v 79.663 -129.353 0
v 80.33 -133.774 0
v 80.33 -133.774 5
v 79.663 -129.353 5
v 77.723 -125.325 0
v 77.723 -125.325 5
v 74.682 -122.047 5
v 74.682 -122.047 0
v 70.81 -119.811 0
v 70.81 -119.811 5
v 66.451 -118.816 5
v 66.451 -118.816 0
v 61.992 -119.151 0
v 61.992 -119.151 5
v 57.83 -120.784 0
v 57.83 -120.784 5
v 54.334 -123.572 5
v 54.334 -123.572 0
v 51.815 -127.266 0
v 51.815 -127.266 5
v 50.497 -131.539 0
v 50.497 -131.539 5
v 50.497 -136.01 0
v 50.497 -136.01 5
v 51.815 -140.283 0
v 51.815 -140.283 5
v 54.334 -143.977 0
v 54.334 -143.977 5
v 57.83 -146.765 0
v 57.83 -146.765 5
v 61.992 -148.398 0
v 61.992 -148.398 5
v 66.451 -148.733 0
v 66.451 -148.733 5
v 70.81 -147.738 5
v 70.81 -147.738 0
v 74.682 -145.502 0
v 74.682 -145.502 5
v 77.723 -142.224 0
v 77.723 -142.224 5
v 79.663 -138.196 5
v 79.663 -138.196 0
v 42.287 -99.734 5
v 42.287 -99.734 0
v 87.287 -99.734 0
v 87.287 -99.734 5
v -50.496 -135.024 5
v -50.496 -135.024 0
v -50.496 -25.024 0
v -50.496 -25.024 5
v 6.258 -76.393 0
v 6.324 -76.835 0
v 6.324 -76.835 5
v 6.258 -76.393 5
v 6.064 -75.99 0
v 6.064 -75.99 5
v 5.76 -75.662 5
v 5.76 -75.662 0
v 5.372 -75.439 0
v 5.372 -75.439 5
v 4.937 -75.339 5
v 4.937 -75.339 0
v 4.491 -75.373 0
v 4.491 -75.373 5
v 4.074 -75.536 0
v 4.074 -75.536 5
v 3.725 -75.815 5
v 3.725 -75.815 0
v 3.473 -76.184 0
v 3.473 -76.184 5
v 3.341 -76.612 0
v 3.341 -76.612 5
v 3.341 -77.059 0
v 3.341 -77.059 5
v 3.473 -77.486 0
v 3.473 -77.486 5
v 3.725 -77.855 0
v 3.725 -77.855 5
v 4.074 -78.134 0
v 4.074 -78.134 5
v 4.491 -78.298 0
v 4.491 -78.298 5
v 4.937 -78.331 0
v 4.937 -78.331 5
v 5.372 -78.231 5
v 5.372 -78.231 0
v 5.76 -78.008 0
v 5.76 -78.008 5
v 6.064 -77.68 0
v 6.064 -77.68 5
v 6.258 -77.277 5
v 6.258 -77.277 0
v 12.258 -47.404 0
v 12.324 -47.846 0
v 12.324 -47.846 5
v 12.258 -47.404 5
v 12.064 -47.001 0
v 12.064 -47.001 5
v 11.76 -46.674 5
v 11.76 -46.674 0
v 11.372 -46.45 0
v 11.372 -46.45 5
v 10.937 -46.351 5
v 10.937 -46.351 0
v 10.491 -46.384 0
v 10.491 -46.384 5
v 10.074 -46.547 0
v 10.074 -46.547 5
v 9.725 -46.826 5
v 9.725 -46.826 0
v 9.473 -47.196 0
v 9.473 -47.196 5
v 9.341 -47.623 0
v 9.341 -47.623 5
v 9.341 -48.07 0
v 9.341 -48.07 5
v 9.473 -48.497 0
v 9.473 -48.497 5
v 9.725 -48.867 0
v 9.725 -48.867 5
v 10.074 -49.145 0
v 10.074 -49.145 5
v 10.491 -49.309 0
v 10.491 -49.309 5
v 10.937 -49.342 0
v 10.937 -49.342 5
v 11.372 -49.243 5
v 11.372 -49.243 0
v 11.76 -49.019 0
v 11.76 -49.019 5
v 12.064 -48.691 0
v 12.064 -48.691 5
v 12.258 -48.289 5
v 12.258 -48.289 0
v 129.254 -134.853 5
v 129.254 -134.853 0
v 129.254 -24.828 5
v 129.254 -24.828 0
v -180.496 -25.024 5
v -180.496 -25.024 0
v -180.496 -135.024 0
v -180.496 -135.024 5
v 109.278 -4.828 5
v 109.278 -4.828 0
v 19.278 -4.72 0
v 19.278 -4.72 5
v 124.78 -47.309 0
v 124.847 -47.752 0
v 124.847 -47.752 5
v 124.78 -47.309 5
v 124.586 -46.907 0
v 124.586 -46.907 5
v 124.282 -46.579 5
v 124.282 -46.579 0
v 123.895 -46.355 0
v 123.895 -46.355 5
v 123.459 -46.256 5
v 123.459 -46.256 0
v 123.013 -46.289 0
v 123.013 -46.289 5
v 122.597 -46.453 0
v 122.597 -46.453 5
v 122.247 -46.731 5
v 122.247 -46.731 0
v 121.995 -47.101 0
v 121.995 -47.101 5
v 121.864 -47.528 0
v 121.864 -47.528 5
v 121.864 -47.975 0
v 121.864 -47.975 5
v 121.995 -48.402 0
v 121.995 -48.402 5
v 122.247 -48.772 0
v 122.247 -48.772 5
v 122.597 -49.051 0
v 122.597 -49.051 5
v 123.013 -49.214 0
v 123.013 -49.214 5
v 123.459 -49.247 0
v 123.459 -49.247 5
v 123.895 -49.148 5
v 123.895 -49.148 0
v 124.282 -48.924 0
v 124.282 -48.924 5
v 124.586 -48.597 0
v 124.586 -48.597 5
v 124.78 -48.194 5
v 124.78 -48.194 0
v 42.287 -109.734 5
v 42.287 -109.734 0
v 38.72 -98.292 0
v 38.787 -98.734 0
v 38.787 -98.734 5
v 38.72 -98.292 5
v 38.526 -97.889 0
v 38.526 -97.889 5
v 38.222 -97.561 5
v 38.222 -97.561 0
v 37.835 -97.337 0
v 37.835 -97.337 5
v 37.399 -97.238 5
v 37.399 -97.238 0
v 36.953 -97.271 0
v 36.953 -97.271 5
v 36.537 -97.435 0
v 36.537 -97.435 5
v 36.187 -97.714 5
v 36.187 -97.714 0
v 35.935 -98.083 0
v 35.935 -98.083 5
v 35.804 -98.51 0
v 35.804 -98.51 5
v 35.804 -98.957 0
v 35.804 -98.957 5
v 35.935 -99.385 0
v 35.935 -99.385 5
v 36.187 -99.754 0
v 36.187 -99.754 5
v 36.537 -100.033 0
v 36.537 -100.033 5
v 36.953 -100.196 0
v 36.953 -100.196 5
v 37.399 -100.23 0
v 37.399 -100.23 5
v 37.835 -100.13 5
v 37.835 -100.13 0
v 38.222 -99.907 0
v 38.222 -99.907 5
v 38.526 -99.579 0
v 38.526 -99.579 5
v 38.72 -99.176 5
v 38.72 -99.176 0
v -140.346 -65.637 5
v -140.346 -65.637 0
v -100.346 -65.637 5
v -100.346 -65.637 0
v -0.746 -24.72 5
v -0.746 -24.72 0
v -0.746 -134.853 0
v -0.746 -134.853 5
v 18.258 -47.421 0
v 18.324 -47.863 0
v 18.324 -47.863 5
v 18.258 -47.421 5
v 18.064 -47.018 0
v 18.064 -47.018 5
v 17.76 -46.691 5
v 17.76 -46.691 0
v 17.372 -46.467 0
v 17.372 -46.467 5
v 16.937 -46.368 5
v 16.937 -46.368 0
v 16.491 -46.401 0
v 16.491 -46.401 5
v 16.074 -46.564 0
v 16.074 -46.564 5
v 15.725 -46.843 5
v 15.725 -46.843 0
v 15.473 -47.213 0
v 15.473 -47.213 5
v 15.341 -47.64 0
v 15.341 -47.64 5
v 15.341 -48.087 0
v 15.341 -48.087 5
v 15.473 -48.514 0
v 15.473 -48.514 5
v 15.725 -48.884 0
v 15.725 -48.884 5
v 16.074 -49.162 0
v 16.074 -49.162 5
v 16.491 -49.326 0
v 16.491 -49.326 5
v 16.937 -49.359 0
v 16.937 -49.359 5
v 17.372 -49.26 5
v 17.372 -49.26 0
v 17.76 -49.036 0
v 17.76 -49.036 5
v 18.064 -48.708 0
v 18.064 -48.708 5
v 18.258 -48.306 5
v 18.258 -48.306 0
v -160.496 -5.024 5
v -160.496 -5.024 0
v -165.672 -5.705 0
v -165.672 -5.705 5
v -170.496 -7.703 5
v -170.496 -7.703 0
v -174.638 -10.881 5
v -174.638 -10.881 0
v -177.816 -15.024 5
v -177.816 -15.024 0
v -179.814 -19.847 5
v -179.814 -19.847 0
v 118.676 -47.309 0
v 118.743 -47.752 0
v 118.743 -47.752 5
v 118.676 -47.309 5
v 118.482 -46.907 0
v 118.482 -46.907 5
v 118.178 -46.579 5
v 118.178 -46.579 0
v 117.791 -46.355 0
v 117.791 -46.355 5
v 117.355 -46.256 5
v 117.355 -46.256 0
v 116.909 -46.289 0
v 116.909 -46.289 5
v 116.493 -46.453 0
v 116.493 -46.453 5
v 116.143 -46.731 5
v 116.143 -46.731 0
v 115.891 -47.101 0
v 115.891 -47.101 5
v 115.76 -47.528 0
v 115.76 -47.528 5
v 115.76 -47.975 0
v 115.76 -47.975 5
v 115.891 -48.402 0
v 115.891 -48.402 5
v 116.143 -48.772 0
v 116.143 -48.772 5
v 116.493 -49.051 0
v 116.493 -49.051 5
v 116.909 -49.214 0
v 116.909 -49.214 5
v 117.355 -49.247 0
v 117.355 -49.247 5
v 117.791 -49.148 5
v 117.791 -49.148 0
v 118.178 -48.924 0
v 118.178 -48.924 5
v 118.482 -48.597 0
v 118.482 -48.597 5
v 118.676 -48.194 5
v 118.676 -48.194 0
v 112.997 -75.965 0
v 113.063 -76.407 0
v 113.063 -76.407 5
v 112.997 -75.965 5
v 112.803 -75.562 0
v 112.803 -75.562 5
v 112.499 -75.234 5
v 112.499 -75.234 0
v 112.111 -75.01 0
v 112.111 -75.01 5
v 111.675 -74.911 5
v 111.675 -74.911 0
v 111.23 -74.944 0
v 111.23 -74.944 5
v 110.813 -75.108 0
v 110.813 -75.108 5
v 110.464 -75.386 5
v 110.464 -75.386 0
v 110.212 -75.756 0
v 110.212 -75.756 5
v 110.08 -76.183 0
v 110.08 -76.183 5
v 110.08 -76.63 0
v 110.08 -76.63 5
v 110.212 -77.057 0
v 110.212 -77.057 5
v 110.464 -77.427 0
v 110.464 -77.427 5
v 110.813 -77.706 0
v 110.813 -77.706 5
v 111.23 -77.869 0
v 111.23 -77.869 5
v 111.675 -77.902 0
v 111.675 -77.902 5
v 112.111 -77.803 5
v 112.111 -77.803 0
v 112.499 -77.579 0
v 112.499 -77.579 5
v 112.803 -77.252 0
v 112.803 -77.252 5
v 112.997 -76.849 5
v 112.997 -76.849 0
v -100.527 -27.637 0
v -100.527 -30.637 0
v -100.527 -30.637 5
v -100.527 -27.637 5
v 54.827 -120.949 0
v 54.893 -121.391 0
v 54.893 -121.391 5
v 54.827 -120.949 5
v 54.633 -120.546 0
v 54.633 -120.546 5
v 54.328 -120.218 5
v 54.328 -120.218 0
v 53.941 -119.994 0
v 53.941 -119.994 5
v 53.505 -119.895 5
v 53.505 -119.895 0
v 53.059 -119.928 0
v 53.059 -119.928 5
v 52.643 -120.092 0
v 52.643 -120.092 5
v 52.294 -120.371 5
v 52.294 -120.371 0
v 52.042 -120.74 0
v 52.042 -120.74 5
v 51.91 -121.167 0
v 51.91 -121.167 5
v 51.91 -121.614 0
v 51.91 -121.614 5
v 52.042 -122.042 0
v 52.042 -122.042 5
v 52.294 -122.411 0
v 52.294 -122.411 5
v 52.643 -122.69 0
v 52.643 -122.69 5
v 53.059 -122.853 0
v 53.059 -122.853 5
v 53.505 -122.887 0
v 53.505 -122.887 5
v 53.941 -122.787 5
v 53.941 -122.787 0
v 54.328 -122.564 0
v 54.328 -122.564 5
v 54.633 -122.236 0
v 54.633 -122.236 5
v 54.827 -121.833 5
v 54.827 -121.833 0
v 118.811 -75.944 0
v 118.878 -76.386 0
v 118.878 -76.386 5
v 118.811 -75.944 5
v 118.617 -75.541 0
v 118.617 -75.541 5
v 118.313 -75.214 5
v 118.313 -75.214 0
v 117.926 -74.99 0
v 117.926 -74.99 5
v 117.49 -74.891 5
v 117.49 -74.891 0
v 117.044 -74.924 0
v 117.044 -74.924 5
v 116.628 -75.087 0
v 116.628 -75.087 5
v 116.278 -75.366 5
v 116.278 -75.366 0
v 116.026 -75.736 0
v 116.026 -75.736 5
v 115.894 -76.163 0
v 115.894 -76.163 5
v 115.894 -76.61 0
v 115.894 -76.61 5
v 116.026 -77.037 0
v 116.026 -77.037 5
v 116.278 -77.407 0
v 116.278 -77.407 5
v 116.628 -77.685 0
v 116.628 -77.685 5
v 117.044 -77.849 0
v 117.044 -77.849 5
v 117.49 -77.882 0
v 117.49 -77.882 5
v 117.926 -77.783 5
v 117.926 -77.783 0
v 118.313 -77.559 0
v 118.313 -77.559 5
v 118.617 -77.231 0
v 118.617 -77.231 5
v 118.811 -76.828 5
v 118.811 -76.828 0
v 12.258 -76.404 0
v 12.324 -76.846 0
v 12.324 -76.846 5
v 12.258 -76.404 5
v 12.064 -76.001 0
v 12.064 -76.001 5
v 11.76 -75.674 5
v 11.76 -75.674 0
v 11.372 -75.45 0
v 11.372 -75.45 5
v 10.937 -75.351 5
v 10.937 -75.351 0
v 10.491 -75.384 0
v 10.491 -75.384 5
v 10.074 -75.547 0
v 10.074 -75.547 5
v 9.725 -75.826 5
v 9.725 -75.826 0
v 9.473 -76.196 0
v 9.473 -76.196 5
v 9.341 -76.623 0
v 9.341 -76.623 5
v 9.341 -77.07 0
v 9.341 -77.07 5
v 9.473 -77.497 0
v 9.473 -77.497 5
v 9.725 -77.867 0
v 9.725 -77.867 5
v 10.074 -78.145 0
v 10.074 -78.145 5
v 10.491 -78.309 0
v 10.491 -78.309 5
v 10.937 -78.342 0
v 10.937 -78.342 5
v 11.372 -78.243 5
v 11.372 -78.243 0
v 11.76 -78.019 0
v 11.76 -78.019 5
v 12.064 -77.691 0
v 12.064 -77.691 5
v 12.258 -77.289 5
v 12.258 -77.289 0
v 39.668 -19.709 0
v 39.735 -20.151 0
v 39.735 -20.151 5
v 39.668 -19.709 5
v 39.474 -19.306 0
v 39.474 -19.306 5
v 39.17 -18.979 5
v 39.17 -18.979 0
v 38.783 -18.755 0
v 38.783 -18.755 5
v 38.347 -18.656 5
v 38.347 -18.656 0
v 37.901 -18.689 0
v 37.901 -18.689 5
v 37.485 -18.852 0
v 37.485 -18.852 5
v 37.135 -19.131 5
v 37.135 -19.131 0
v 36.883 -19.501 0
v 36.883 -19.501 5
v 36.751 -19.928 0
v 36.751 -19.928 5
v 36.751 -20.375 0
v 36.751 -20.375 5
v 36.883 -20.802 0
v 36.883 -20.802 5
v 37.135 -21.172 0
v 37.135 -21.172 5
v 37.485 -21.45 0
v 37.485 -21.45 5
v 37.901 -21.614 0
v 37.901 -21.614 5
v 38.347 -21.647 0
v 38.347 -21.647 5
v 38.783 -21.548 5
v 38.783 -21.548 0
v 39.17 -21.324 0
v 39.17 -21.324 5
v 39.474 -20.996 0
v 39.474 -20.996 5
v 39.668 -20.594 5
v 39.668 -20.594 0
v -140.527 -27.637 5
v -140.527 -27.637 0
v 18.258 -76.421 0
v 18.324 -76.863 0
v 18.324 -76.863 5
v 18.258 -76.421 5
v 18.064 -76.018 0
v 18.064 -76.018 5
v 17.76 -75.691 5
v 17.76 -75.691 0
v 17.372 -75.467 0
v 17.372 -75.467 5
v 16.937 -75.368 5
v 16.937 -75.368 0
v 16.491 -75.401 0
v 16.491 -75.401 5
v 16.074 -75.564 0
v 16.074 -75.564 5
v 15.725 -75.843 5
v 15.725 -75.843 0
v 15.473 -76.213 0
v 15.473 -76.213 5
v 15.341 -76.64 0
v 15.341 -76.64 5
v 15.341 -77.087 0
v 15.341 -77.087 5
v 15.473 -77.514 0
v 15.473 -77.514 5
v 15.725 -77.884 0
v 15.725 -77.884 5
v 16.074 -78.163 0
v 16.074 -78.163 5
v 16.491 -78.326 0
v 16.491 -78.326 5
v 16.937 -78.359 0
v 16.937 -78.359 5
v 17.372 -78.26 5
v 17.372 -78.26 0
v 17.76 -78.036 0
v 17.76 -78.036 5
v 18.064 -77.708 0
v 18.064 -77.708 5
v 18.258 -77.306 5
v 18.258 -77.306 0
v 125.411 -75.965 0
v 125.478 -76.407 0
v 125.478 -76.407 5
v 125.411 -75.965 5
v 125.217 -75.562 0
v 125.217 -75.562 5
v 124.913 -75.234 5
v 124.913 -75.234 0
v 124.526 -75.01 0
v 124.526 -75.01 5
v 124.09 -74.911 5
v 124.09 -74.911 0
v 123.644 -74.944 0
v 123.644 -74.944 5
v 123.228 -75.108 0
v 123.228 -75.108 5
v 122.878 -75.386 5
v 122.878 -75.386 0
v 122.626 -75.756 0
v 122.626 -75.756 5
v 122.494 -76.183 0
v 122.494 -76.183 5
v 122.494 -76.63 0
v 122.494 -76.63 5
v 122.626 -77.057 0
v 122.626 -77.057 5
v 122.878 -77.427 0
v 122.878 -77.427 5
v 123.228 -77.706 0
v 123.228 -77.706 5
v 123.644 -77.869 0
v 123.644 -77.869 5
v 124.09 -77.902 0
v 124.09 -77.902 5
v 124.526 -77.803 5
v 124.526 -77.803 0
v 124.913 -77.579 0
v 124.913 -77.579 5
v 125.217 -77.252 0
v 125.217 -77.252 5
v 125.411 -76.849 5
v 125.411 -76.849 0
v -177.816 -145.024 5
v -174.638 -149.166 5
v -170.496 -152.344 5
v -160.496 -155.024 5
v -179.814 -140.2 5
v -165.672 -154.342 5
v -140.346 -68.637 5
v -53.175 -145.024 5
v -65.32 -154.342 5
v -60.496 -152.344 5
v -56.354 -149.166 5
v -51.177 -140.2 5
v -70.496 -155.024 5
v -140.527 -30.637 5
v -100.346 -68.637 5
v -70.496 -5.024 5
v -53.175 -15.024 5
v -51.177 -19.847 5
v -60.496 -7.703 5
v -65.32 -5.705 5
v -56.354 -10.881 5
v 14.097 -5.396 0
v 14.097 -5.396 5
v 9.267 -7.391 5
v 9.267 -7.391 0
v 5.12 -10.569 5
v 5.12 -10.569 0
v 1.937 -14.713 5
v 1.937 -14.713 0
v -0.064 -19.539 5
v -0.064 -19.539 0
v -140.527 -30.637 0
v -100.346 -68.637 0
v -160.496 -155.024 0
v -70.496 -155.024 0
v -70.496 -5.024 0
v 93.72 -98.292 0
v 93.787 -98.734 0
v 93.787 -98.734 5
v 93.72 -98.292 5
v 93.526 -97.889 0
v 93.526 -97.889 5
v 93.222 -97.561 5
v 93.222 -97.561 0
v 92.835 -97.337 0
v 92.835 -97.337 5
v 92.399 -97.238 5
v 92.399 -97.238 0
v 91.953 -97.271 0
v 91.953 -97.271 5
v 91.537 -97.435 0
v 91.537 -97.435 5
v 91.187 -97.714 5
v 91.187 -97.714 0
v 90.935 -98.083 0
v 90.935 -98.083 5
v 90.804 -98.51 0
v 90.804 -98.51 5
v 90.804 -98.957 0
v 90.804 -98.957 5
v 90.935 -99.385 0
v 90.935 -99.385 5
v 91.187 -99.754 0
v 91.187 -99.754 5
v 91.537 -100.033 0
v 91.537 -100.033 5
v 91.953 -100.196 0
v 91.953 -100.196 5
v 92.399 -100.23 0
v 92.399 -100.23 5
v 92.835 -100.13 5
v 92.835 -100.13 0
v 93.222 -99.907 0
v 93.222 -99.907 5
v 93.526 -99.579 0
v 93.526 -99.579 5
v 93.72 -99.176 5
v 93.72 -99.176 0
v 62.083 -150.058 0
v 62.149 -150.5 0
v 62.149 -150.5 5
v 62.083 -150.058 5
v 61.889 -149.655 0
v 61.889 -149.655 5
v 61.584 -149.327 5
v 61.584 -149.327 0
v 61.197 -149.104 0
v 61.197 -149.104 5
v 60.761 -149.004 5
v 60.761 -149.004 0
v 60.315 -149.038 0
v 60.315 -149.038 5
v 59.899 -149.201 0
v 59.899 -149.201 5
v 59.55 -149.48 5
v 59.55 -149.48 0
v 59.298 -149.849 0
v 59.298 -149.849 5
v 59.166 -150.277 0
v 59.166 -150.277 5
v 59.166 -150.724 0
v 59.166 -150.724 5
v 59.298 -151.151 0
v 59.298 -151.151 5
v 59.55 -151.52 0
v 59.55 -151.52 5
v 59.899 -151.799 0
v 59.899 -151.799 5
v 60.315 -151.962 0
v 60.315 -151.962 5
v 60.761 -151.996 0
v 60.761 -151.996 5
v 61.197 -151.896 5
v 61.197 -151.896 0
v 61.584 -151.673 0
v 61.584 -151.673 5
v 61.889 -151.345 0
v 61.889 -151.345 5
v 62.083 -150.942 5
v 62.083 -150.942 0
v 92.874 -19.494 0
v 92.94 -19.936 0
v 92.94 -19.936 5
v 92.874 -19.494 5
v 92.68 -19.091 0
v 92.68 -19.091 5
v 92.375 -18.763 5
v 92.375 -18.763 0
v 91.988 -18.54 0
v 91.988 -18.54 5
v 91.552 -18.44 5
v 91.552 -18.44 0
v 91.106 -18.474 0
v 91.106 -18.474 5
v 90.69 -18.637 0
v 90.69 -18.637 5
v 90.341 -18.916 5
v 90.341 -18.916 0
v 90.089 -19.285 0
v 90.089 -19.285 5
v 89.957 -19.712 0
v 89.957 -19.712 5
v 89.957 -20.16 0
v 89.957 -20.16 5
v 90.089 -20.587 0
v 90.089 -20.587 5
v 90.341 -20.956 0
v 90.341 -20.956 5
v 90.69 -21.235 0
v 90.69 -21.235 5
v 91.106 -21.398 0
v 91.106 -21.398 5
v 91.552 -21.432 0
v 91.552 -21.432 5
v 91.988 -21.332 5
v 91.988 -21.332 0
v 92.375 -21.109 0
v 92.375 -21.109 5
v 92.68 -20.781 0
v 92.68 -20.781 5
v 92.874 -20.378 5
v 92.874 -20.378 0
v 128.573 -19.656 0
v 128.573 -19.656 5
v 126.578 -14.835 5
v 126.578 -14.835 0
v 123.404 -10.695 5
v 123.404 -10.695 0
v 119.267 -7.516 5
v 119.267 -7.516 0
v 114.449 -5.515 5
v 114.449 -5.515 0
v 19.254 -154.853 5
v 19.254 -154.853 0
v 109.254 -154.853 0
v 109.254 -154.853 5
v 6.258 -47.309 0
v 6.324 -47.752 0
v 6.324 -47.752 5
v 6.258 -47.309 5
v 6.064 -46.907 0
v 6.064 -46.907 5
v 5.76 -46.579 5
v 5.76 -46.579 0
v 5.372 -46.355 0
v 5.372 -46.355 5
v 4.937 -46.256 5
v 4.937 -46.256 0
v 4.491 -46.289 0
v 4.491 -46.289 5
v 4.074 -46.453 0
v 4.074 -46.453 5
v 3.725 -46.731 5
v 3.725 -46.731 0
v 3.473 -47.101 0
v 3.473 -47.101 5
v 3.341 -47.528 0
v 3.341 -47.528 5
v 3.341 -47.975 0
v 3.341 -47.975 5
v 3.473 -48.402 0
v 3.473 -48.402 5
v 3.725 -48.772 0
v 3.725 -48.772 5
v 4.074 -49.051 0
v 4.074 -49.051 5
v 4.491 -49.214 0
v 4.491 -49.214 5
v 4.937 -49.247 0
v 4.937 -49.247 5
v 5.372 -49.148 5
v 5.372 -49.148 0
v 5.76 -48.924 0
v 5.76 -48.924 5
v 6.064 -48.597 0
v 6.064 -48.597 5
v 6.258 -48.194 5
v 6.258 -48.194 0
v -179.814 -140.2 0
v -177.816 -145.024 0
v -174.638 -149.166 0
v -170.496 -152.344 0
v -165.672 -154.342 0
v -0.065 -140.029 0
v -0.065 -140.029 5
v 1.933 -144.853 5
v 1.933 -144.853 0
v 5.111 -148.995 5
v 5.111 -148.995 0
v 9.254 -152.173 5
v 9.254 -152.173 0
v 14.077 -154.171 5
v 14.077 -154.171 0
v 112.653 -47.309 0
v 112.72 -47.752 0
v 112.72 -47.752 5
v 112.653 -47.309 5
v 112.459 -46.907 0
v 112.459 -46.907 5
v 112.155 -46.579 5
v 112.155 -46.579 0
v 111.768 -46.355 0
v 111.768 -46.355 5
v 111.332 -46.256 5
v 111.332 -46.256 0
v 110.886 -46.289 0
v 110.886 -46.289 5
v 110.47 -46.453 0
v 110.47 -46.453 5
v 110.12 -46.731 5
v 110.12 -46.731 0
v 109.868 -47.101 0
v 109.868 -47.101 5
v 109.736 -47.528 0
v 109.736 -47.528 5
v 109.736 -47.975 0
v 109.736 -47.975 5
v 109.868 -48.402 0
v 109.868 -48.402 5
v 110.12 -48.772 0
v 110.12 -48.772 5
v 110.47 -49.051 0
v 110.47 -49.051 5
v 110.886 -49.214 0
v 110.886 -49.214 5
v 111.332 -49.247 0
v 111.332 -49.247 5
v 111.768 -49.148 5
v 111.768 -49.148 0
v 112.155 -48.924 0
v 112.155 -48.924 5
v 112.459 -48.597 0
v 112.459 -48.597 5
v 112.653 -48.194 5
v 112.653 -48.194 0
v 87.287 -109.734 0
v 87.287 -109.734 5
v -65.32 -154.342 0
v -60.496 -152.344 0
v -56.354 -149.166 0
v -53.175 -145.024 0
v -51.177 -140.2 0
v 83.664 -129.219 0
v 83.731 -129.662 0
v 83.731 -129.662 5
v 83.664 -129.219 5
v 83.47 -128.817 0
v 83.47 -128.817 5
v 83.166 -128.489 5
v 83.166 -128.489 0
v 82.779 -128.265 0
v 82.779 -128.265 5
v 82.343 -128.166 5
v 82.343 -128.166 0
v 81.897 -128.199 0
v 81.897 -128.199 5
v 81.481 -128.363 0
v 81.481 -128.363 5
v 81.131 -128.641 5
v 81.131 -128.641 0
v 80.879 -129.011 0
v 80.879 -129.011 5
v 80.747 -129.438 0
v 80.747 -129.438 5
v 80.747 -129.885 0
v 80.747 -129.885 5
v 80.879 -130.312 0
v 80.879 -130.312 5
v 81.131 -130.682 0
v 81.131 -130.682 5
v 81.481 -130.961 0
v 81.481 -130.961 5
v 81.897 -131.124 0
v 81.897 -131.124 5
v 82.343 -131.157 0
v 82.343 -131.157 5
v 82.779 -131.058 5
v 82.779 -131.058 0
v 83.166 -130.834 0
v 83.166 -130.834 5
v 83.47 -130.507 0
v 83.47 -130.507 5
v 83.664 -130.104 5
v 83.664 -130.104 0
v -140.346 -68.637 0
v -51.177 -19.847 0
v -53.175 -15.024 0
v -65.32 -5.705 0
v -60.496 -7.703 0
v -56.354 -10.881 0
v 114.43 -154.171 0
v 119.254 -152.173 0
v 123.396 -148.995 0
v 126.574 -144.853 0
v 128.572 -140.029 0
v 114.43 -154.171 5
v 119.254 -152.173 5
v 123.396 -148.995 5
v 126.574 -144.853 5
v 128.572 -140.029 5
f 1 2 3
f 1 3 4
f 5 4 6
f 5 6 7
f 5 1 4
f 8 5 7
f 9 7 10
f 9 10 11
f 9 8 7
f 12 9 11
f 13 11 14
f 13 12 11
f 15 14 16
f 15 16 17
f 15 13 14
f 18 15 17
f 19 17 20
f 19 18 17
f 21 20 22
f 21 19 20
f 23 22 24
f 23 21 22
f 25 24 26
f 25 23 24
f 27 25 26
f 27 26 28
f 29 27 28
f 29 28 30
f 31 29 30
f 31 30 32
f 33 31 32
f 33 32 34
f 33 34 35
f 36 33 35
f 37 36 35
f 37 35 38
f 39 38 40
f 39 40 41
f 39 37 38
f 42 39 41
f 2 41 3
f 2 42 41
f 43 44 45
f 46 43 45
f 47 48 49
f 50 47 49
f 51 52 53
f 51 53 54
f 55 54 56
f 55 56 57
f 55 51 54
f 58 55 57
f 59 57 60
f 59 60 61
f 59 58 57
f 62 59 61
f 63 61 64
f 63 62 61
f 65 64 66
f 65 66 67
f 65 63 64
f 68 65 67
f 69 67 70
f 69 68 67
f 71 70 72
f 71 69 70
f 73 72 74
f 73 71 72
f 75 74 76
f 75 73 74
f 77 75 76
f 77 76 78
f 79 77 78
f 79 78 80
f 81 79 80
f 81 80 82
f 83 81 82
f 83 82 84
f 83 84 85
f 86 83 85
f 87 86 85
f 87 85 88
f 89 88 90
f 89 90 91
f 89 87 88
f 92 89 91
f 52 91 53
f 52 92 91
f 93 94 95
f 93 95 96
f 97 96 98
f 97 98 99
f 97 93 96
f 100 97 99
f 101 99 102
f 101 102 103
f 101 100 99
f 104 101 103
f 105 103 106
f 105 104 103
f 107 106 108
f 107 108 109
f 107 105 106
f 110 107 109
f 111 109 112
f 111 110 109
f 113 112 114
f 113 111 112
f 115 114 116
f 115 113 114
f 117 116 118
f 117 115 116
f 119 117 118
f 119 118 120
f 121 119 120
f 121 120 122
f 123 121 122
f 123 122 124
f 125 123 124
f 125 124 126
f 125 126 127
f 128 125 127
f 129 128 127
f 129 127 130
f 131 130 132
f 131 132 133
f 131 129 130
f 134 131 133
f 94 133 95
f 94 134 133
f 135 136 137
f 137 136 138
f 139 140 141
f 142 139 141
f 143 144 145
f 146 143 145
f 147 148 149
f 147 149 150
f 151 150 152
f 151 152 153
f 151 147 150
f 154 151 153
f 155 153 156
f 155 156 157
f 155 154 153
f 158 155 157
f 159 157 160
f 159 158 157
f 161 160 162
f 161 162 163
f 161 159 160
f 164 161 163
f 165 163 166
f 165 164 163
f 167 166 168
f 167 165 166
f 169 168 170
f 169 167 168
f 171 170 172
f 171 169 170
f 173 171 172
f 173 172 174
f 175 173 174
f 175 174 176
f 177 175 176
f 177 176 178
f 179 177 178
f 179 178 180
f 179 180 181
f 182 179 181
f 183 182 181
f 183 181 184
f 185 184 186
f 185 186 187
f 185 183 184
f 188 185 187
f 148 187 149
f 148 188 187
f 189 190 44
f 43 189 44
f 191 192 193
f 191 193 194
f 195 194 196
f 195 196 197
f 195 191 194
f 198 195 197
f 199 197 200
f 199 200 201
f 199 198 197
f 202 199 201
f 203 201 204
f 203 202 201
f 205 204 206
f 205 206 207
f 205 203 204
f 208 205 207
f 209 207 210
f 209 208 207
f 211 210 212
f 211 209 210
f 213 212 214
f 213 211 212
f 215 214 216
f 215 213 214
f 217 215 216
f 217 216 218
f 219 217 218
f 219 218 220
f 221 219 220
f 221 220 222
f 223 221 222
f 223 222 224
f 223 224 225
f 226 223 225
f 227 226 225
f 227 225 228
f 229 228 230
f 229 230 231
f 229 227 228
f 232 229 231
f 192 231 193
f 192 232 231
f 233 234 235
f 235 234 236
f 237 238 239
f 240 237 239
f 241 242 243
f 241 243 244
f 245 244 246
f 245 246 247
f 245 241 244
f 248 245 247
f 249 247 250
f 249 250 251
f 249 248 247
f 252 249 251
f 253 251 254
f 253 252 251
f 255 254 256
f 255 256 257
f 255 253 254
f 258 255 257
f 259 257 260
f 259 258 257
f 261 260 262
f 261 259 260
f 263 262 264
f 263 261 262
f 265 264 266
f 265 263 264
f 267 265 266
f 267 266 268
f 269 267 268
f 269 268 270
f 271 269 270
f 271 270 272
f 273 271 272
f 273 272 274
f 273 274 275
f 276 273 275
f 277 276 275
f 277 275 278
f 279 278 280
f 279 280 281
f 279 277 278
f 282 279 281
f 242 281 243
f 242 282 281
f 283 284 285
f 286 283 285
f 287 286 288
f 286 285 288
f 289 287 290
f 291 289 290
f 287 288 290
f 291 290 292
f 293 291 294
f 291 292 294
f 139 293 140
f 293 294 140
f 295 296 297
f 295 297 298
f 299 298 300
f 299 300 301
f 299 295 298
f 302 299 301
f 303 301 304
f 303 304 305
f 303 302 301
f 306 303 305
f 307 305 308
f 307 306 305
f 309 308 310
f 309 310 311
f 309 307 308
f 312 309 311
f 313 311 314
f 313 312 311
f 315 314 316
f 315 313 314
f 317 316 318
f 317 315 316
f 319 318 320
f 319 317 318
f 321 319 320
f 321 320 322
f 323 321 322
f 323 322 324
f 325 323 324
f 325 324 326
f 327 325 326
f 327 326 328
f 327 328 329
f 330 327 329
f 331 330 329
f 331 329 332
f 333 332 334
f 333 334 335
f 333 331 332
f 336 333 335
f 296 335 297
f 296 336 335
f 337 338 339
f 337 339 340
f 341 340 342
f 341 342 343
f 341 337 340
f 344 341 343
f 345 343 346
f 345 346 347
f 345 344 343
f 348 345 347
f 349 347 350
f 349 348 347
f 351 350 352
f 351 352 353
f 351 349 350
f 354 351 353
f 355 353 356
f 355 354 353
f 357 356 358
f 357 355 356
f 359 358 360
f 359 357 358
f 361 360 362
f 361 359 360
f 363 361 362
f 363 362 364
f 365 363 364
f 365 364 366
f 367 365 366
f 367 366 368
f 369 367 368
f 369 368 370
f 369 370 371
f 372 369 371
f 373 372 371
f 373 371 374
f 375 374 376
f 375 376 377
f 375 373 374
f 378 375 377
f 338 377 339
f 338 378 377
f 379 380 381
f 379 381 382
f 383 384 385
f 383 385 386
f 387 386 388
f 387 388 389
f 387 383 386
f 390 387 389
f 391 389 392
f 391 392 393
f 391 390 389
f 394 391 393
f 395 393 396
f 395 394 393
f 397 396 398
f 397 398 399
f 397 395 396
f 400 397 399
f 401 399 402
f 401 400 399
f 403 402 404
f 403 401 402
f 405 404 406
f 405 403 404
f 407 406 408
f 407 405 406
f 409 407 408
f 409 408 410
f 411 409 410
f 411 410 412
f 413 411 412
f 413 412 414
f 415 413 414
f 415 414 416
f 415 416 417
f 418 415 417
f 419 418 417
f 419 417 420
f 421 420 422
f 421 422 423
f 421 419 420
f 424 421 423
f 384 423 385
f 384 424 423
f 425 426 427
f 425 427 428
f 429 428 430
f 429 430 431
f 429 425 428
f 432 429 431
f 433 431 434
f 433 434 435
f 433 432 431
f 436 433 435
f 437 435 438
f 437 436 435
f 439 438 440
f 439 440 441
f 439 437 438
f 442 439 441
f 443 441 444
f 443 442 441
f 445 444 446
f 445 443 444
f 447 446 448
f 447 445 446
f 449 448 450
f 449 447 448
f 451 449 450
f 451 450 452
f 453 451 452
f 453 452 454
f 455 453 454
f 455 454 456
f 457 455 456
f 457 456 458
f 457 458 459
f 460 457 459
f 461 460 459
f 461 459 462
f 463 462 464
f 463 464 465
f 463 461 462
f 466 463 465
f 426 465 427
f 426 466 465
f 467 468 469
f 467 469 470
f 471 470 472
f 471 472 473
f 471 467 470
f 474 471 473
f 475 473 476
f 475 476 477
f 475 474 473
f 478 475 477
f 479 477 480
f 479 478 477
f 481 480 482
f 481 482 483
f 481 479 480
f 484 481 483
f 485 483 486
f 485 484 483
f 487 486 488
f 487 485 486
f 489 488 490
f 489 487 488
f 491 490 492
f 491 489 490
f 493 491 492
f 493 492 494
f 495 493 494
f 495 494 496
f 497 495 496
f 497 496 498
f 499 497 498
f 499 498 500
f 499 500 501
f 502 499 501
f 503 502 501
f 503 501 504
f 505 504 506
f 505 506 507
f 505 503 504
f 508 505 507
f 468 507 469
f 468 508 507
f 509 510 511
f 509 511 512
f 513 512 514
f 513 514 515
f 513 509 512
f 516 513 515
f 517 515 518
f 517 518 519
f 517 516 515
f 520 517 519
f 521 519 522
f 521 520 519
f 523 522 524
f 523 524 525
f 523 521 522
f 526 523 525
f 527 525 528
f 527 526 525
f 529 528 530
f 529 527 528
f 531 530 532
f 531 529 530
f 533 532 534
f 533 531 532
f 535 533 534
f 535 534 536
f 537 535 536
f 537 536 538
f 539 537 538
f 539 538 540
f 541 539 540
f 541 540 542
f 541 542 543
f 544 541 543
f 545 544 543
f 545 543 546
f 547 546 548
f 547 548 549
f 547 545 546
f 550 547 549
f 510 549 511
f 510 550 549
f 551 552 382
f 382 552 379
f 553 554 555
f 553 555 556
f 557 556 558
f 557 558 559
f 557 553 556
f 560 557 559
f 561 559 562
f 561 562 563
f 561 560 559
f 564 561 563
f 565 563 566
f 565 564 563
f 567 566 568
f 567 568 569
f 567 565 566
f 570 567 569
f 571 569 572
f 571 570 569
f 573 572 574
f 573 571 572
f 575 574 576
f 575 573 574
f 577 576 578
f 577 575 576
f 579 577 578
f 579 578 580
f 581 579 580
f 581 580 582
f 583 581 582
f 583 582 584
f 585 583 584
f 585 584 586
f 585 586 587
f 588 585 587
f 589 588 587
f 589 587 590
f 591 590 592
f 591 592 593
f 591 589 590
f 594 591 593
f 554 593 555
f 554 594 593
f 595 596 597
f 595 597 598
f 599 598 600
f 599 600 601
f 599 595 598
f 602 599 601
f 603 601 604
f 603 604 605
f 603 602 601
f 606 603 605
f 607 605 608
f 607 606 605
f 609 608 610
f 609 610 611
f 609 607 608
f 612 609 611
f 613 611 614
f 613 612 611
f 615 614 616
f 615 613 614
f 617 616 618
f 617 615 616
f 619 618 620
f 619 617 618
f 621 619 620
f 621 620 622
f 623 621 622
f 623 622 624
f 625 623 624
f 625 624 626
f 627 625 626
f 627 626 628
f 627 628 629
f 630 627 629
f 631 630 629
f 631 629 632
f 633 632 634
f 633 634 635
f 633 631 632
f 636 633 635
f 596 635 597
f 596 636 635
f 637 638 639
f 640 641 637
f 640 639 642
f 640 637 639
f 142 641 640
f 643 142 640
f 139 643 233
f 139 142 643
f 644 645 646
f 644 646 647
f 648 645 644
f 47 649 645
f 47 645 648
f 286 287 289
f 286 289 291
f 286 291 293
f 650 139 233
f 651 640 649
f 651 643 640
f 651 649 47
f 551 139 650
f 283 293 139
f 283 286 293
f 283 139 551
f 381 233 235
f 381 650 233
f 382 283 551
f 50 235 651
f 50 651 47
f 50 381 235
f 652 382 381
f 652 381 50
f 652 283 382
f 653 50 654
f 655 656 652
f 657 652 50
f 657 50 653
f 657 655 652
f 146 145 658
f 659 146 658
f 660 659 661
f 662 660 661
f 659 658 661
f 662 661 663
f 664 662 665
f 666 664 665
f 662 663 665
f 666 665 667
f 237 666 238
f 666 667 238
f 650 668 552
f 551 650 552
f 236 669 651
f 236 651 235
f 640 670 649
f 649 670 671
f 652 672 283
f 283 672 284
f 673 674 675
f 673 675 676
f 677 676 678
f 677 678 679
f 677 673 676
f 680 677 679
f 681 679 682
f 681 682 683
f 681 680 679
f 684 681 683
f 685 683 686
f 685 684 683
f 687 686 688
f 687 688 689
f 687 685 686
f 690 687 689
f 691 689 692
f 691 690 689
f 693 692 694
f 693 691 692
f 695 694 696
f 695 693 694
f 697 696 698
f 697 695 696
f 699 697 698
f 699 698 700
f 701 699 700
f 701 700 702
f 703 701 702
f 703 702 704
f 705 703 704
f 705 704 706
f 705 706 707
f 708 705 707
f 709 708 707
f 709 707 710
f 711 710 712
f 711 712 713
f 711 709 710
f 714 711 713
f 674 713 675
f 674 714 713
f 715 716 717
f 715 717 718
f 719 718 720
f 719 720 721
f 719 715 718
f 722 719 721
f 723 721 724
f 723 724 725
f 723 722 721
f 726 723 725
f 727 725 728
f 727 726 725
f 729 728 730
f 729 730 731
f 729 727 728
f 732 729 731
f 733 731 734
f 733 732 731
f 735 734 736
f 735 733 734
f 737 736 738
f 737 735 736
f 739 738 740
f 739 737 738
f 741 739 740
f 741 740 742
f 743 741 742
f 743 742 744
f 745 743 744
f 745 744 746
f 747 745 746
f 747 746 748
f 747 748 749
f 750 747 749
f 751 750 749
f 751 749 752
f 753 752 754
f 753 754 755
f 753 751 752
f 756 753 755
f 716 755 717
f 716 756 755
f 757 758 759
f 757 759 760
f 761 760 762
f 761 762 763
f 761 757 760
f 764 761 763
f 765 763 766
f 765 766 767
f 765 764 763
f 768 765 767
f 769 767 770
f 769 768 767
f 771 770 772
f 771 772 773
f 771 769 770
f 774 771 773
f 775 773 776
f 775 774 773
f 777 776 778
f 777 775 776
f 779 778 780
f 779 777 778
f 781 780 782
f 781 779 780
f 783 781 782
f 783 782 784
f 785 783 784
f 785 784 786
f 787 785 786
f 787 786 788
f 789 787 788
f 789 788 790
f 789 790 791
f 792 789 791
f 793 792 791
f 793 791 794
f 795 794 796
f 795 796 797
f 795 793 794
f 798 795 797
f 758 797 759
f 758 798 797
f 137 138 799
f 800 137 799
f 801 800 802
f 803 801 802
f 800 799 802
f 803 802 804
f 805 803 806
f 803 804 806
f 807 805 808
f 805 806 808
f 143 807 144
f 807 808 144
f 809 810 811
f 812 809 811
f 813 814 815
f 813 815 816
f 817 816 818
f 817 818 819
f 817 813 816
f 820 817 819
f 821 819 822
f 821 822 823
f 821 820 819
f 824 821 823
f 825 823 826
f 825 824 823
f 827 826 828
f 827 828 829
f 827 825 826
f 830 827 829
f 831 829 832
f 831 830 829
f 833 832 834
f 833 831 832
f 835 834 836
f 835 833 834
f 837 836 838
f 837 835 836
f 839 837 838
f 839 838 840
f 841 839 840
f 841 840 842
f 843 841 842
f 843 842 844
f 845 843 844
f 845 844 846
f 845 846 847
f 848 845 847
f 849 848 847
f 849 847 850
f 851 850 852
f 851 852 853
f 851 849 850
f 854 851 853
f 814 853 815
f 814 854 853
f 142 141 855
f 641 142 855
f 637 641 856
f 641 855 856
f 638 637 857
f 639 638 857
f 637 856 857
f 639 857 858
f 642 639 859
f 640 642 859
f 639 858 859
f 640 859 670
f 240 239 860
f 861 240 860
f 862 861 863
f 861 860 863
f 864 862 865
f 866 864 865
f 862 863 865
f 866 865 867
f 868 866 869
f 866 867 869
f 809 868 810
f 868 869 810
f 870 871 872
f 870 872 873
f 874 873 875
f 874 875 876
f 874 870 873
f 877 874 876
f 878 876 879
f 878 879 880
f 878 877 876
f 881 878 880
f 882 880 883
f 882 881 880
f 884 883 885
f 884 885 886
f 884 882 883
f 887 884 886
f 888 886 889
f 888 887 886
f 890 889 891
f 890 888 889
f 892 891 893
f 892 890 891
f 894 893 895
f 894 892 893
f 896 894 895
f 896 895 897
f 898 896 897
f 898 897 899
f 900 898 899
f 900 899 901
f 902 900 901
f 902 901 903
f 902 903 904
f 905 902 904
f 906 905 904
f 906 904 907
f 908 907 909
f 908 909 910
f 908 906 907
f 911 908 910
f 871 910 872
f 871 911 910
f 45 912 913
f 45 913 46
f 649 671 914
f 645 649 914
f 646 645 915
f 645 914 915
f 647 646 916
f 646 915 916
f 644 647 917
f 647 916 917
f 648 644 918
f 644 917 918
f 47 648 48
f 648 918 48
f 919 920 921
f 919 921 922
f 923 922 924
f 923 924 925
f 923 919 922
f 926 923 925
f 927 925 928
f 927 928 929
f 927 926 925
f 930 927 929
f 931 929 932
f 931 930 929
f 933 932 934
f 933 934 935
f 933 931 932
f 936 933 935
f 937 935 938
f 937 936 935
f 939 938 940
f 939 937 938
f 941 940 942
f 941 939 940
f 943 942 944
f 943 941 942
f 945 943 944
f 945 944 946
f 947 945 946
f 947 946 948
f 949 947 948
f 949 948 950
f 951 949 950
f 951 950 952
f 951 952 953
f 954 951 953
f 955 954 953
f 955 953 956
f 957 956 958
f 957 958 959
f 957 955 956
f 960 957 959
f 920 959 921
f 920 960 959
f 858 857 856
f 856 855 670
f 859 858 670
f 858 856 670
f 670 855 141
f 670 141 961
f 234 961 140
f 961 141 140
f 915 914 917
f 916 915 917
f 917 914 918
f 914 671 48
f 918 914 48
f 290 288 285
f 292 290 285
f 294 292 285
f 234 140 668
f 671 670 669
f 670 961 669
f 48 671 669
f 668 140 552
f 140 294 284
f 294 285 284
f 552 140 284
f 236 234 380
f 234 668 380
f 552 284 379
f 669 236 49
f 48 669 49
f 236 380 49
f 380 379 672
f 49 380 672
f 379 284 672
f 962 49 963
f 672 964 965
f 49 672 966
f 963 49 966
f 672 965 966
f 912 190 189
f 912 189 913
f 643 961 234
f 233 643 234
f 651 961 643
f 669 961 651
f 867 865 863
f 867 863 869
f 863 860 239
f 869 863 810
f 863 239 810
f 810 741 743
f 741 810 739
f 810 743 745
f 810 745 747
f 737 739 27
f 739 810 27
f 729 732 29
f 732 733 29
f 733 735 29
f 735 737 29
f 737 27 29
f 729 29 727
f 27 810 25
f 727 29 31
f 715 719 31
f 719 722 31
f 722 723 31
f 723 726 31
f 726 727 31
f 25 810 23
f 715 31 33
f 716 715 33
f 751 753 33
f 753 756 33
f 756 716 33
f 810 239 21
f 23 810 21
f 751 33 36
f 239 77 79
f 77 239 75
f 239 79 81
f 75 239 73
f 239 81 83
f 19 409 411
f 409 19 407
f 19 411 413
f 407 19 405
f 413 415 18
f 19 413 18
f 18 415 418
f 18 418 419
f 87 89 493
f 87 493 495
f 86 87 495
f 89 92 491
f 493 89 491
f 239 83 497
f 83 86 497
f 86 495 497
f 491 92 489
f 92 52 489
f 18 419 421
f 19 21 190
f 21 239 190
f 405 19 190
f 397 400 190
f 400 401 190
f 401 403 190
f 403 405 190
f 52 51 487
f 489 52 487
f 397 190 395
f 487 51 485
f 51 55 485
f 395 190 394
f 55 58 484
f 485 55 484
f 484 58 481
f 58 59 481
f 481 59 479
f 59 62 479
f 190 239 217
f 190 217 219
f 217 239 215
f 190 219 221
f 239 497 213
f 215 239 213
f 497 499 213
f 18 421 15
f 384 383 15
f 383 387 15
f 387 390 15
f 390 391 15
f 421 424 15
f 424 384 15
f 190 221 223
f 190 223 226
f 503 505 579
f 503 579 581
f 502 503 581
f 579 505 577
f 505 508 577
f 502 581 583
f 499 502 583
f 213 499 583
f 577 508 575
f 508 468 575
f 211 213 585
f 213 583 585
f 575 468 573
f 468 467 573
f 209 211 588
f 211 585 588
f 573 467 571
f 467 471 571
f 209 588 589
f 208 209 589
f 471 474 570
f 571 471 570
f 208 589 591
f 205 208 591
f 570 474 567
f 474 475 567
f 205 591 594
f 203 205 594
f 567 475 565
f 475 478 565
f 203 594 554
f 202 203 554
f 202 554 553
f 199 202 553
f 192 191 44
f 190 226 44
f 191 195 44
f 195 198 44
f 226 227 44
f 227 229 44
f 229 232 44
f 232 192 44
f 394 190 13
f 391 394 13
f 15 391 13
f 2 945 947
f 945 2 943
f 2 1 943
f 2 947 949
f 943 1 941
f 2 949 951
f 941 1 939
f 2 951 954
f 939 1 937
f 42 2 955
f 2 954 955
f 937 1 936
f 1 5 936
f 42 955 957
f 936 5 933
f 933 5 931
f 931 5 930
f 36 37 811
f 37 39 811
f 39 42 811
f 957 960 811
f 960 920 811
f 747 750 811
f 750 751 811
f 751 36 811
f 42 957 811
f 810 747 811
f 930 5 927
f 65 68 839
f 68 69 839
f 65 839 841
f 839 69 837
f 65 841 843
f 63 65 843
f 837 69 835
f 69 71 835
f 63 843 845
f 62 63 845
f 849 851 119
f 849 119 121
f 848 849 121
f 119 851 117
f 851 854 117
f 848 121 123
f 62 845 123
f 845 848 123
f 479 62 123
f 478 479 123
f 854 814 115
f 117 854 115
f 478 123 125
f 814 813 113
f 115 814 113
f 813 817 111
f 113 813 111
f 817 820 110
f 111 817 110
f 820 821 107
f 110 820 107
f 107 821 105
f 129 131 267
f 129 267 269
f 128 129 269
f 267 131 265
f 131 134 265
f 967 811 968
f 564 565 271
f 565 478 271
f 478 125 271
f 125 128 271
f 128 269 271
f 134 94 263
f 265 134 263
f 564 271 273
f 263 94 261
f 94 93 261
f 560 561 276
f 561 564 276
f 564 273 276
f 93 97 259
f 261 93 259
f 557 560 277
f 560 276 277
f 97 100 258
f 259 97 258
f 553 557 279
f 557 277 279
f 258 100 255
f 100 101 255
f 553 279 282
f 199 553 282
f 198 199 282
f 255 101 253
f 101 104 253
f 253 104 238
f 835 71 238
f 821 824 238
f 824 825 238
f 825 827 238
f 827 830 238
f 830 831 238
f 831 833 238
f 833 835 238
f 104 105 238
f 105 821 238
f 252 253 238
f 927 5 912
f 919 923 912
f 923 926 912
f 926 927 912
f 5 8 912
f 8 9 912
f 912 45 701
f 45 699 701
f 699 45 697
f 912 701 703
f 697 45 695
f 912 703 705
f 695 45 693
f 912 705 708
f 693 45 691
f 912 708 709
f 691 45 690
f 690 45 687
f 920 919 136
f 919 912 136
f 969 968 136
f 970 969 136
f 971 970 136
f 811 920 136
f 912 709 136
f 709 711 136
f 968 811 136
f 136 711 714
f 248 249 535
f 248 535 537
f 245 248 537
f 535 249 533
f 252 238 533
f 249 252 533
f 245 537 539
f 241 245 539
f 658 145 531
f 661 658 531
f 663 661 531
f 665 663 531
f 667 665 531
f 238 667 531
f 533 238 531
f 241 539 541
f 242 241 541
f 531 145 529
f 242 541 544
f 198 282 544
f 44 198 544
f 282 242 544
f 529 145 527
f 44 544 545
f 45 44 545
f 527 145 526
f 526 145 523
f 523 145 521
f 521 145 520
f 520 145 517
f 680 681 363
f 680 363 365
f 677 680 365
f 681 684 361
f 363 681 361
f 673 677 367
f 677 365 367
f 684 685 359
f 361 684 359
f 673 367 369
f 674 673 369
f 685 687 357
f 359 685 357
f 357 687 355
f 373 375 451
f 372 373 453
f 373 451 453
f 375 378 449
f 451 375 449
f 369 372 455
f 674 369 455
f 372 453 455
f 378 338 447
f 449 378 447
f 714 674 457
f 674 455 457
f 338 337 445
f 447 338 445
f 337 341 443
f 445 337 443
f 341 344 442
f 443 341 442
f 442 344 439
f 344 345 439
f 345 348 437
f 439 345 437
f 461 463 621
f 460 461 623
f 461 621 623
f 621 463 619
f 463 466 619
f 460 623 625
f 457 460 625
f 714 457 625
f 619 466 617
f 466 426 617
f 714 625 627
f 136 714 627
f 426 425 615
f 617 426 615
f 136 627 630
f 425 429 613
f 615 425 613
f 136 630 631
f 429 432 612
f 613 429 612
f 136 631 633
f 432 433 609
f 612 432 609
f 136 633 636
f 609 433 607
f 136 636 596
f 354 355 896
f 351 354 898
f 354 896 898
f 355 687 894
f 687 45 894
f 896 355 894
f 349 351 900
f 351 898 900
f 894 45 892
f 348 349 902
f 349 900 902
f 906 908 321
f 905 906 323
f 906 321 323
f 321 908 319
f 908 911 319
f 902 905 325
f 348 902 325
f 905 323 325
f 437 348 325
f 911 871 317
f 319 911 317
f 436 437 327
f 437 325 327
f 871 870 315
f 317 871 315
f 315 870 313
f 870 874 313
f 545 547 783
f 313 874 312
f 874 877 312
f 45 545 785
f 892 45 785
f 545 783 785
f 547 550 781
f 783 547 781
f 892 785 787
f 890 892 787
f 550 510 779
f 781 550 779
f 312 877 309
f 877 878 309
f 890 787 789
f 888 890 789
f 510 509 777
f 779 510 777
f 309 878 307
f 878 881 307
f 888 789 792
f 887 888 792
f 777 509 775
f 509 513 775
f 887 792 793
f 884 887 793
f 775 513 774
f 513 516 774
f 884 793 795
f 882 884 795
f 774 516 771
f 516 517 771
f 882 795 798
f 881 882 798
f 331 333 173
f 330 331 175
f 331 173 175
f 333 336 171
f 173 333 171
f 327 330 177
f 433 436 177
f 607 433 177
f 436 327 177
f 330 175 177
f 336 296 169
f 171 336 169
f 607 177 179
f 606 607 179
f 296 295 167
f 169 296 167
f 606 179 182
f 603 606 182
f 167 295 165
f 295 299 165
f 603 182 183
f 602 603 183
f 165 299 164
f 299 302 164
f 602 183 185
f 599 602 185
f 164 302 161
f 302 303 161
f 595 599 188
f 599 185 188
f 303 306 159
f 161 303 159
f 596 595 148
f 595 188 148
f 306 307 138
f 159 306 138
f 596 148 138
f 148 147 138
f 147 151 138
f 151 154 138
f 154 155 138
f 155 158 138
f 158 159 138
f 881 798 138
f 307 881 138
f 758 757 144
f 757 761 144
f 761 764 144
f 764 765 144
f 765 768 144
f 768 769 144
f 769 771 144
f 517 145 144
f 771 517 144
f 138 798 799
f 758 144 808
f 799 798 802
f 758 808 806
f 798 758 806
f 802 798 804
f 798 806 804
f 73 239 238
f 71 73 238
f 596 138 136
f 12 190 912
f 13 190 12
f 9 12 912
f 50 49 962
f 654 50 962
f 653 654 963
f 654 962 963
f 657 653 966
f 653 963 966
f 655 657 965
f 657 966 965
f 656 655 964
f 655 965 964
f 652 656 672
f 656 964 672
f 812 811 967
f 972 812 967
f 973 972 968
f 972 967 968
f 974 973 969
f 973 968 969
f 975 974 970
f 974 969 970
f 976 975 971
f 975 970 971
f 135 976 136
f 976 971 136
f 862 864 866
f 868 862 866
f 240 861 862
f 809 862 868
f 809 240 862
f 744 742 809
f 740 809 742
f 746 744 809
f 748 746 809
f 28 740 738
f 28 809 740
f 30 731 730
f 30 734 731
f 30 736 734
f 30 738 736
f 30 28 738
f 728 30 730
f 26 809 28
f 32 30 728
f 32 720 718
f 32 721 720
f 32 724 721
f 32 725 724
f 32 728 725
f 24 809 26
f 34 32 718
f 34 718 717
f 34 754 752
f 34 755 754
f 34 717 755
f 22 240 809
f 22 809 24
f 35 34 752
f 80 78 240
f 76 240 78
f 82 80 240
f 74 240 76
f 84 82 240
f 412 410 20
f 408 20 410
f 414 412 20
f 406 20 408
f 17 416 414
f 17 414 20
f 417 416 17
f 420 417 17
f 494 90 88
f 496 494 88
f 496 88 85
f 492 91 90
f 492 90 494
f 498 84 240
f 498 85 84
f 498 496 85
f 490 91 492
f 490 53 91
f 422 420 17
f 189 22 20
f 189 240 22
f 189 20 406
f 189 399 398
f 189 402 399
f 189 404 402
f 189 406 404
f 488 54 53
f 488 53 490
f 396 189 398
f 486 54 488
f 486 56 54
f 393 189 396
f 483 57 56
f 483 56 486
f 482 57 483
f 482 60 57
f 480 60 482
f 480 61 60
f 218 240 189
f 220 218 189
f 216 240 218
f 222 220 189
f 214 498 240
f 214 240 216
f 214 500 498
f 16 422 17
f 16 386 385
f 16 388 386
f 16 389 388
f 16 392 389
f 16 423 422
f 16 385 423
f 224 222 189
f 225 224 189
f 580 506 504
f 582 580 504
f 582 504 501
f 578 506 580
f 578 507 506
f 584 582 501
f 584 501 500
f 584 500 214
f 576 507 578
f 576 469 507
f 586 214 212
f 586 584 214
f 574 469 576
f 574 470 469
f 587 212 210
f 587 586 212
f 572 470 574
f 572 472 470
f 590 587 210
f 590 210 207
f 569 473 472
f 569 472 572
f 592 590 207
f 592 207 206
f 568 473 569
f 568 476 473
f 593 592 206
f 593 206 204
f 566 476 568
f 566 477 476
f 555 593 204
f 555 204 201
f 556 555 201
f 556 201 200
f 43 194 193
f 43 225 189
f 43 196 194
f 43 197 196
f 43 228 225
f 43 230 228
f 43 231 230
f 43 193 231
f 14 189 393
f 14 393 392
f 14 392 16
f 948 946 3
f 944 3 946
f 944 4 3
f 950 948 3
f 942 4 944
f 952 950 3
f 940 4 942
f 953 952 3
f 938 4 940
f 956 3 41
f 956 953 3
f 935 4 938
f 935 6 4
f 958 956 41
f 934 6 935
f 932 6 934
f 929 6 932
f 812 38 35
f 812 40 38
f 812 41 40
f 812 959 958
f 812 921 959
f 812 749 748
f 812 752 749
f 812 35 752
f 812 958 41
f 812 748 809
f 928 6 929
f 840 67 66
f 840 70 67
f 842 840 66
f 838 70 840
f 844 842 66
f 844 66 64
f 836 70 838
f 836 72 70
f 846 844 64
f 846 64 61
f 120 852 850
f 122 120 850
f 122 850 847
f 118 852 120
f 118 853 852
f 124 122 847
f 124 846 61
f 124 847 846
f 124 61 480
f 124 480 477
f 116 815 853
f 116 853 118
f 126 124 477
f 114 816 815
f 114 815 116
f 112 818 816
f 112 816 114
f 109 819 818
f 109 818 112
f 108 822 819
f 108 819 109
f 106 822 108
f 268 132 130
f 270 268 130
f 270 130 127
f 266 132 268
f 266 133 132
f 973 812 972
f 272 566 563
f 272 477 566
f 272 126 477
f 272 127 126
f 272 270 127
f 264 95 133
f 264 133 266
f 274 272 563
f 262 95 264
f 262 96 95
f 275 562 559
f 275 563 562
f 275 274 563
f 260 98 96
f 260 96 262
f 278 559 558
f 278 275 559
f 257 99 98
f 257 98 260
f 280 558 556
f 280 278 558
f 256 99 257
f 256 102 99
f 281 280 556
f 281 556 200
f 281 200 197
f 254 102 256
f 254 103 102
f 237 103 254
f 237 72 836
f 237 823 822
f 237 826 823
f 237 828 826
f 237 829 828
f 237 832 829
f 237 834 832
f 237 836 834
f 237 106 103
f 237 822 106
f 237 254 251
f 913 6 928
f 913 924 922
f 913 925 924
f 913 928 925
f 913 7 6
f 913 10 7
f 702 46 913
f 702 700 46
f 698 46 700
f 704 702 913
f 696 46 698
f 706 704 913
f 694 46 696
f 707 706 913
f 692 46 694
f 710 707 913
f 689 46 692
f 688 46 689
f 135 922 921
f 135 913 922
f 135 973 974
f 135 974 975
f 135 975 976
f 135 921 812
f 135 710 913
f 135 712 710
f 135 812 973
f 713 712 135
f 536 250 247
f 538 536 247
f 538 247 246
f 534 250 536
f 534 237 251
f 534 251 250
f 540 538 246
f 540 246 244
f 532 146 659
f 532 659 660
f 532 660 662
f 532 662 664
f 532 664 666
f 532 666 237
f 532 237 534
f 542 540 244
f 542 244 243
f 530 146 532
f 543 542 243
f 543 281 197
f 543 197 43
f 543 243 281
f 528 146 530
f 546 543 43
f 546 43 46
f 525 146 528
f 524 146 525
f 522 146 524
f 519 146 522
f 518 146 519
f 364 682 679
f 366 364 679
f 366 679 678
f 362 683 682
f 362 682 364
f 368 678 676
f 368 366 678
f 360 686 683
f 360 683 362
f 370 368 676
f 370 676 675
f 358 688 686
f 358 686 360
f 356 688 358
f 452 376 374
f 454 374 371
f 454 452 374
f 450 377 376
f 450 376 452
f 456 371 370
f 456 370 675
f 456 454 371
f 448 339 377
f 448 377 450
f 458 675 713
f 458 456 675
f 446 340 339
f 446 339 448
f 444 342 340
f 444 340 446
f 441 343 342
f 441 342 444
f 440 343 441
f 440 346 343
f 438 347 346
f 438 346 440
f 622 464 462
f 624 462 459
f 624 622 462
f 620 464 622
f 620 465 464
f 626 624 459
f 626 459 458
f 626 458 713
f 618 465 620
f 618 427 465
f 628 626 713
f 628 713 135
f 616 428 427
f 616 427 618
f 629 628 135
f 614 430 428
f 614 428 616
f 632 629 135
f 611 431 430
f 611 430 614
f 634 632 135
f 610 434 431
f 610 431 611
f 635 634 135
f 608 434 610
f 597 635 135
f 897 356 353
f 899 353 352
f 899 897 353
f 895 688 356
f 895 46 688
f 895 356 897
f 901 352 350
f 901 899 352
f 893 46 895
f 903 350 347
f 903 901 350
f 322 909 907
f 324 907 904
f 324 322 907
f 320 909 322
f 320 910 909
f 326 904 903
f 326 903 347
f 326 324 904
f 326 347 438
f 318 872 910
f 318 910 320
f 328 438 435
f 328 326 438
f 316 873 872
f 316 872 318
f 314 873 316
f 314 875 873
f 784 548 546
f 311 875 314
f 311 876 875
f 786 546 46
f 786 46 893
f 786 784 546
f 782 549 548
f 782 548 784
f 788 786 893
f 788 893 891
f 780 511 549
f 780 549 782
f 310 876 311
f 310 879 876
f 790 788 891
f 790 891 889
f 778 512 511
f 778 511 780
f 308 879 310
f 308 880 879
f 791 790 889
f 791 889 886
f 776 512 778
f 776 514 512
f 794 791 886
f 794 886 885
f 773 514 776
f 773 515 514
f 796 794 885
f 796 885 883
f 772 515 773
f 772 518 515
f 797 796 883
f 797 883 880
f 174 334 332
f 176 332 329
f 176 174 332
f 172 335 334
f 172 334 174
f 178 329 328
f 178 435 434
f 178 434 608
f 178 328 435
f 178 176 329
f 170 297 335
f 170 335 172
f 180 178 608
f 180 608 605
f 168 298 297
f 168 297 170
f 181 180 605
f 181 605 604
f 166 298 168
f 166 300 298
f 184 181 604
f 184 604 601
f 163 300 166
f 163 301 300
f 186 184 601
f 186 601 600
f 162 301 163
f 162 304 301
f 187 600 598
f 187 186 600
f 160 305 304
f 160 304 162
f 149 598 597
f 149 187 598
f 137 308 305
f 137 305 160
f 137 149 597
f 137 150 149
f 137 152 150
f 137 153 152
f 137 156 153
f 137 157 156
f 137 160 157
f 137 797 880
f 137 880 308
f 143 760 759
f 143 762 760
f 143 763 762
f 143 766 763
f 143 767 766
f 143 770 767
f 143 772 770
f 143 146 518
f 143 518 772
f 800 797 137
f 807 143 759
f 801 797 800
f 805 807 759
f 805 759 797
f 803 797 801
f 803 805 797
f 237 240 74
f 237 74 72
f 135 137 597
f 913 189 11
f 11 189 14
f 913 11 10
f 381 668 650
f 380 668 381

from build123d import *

# Parameters (mm, degrees)
F0_R     = 1.5000012089
F0_R_2   = 15.0000120892
F0_W     = 63
F0_H     = 28
F0_R_3   = 1.5
F0_W_2   = 45
F0_H_2   = 10
F1_DEPTH = 5
F0_W_3   = 40
F0_H_3   = 3
F2_DEPTH = 5


# Not quite as in the source:
# - a feature names something its author has since deleted; it is built from what else it names


with BuildPart() as f1:
    # F0 (on Top) → F1 (new body)
    with BuildSketch(Plane.XY):
        with BuildLine():
            Line((109.2777046029, -4.8284545538), (19.2777046029, -4.7197510892))
            ThreePointArc((19.2777046029, -4.7197510892), (5.1199557962, -10.5690629101), (-0.746451705, -24.719736501))
            Line((-0.746451705, -24.719736501), (-0.746451705, -134.8525817028))
            ThreePointArc((-0.746451705, -134.8525817028), (5.1114126713, -148.9947173266), (19.253548295, -154.8525817028))
            Line((19.253548295, -154.8525817028), (109.253548295, -154.8525817028))
            ThreePointArc((109.253548295, -154.8525817028), (123.3956839188, -148.9947173266), (129.253548295, -134.8525817028))
            Line((129.253548295, -134.8525817028), (129.253548295, -24.8284399656))
            ThreePointArc((129.253548295, -24.8284399656), (123.404221886, -10.6948474668), (109.2777046029, -4.8284545538))
        make_face()
        with Locations((60.6492295242, -150.5000877334)):
            Circle(F0_R, mode=Mode.SUBTRACT)
        with Locations((65.3296712528, -133.7744518814)):
            Circle(F0_R_2, mode=Mode.SUBTRACT)
        with Locations((82.2305977345, -129.661552608)):
            Circle(F0_R, mode=Mode.SUBTRACT)
        with Locations((53.3932128331, -121.3908070522)):
            Circle(F0_R, mode=Mode.SUBTRACT)
        with Locations((64.7868365049, -98.7337777073)):
            Rectangle(F0_W, F0_H, mode=Mode.SUBTRACT)
        with Locations((4.8244629152, -76.8351420979)):
            Circle(F0_R, mode=Mode.SUBTRACT)
        with Locations((10.8244677509, -76.8464319149)):
            Circle(F0_R, mode=Mode.SUBTRACT)
        with Locations((16.8244725865, -76.8634664953)):
            Circle(F0_R, mode=Mode.SUBTRACT)
        with Locations((4.8244629152, -47.7516189505)):
            Circle(F0_R, mode=Mode.SUBTRACT)
        with Locations((10.8244677509, -47.8464085426)):
            Circle(F0_R, mode=Mode.SUBTRACT)
        with Locations((16.8244725865, -47.8634431229)):
            Circle(F0_R, mode=Mode.SUBTRACT)
        with Locations((111.5633096981, -76.4066539684)):
            Circle(F0_R, mode=Mode.SUBTRACT)
        with Locations((117.3776644514, -76.3863511993)):
            Circle(F0_R, mode=Mode.SUBTRACT)
        with Locations((123.9776462317, -76.4066539684)):
            Circle(F0_R, mode=Mode.SUBTRACT)
        with Locations((111.2195700407, -47.7516189505)):
            Circle(F0_R, mode=Mode.SUBTRACT)
        with Locations((117.2429174185, -47.7516189505)):
            Circle(F0_R, mode=Mode.SUBTRACT)
        with Locations((123.3468130231, -47.7516189505)):
            Circle(F0_R, mode=Mode.SUBTRACT)
        with Locations((38.2347119981, -20.1513972986)):
            Circle(F0_R_3, mode=Mode.SUBTRACT)
        with Locations((91.4401854171, -19.9359528023)):
            Circle(F0_R_3, mode=Mode.SUBTRACT)
        with Locations((64.7868365049, -98.7337777073)):
            Rectangle(F0_W, F0_H)
        with Locations((37.2868365049, -98.7337777073)):
            Circle(F0_R_3, mode=Mode.SUBTRACT)
        with Locations((64.7868365049, -104.7337777073)):
            Rectangle(F0_W_2, F0_H_2, mode=Mode.SUBTRACT)
        with Locations((92.2868365049, -98.7337777073)):
            Circle(F0_R_3, mode=Mode.SUBTRACT)
    extrude(amount=F1_DEPTH)


with BuildPart() as f2:
    # F0 (on Top) → F2 (new body)
    with BuildSketch(Plane.XY):
        with BuildLine():
            Line((-70.49592942, -5.0235935599), (-160.49592942, -5.0235935599))
            ThreePointArc((-160.49592942, -5.0235935599), (-174.6380650437, -10.8814579361), (-180.49592942, -25.0235935599))
            Line((-180.49592942, -25.0235935599), (-180.49592942, -135.0235935599))
            ThreePointArc((-180.49592942, -135.0235935599), (-174.6380650437, -149.1657291836), (-160.49592942, -155.0235935599))
            Line((-160.49592942, -155.0235935599), (-70.49592942, -155.0235935599))
            ThreePointArc((-70.49592942, -155.0235935599), (-56.3537937963, -149.1657291836), (-50.49592942, -135.0235935599))
            Line((-50.49592942, -135.0235935599), (-50.49592942, -25.0235935599))
            ThreePointArc((-50.49592942, -25.0235935599), (-56.3537937963, -10.8814579361), (-70.49592942, -5.0235935599))
        make_face()
        with Locations((-120.3460991383, -67.1373978257)):
            Rectangle(F0_W_3, F0_H_3, mode=Mode.SUBTRACT)
        with Locations((-120.5274779797, -29.1373978257)):
            Rectangle(F0_W_3, F0_H_3, mode=Mode.SUBTRACT)
    extrude(amount=F2_DEPTH)


solid = Compound([f1.part, f2.part])
